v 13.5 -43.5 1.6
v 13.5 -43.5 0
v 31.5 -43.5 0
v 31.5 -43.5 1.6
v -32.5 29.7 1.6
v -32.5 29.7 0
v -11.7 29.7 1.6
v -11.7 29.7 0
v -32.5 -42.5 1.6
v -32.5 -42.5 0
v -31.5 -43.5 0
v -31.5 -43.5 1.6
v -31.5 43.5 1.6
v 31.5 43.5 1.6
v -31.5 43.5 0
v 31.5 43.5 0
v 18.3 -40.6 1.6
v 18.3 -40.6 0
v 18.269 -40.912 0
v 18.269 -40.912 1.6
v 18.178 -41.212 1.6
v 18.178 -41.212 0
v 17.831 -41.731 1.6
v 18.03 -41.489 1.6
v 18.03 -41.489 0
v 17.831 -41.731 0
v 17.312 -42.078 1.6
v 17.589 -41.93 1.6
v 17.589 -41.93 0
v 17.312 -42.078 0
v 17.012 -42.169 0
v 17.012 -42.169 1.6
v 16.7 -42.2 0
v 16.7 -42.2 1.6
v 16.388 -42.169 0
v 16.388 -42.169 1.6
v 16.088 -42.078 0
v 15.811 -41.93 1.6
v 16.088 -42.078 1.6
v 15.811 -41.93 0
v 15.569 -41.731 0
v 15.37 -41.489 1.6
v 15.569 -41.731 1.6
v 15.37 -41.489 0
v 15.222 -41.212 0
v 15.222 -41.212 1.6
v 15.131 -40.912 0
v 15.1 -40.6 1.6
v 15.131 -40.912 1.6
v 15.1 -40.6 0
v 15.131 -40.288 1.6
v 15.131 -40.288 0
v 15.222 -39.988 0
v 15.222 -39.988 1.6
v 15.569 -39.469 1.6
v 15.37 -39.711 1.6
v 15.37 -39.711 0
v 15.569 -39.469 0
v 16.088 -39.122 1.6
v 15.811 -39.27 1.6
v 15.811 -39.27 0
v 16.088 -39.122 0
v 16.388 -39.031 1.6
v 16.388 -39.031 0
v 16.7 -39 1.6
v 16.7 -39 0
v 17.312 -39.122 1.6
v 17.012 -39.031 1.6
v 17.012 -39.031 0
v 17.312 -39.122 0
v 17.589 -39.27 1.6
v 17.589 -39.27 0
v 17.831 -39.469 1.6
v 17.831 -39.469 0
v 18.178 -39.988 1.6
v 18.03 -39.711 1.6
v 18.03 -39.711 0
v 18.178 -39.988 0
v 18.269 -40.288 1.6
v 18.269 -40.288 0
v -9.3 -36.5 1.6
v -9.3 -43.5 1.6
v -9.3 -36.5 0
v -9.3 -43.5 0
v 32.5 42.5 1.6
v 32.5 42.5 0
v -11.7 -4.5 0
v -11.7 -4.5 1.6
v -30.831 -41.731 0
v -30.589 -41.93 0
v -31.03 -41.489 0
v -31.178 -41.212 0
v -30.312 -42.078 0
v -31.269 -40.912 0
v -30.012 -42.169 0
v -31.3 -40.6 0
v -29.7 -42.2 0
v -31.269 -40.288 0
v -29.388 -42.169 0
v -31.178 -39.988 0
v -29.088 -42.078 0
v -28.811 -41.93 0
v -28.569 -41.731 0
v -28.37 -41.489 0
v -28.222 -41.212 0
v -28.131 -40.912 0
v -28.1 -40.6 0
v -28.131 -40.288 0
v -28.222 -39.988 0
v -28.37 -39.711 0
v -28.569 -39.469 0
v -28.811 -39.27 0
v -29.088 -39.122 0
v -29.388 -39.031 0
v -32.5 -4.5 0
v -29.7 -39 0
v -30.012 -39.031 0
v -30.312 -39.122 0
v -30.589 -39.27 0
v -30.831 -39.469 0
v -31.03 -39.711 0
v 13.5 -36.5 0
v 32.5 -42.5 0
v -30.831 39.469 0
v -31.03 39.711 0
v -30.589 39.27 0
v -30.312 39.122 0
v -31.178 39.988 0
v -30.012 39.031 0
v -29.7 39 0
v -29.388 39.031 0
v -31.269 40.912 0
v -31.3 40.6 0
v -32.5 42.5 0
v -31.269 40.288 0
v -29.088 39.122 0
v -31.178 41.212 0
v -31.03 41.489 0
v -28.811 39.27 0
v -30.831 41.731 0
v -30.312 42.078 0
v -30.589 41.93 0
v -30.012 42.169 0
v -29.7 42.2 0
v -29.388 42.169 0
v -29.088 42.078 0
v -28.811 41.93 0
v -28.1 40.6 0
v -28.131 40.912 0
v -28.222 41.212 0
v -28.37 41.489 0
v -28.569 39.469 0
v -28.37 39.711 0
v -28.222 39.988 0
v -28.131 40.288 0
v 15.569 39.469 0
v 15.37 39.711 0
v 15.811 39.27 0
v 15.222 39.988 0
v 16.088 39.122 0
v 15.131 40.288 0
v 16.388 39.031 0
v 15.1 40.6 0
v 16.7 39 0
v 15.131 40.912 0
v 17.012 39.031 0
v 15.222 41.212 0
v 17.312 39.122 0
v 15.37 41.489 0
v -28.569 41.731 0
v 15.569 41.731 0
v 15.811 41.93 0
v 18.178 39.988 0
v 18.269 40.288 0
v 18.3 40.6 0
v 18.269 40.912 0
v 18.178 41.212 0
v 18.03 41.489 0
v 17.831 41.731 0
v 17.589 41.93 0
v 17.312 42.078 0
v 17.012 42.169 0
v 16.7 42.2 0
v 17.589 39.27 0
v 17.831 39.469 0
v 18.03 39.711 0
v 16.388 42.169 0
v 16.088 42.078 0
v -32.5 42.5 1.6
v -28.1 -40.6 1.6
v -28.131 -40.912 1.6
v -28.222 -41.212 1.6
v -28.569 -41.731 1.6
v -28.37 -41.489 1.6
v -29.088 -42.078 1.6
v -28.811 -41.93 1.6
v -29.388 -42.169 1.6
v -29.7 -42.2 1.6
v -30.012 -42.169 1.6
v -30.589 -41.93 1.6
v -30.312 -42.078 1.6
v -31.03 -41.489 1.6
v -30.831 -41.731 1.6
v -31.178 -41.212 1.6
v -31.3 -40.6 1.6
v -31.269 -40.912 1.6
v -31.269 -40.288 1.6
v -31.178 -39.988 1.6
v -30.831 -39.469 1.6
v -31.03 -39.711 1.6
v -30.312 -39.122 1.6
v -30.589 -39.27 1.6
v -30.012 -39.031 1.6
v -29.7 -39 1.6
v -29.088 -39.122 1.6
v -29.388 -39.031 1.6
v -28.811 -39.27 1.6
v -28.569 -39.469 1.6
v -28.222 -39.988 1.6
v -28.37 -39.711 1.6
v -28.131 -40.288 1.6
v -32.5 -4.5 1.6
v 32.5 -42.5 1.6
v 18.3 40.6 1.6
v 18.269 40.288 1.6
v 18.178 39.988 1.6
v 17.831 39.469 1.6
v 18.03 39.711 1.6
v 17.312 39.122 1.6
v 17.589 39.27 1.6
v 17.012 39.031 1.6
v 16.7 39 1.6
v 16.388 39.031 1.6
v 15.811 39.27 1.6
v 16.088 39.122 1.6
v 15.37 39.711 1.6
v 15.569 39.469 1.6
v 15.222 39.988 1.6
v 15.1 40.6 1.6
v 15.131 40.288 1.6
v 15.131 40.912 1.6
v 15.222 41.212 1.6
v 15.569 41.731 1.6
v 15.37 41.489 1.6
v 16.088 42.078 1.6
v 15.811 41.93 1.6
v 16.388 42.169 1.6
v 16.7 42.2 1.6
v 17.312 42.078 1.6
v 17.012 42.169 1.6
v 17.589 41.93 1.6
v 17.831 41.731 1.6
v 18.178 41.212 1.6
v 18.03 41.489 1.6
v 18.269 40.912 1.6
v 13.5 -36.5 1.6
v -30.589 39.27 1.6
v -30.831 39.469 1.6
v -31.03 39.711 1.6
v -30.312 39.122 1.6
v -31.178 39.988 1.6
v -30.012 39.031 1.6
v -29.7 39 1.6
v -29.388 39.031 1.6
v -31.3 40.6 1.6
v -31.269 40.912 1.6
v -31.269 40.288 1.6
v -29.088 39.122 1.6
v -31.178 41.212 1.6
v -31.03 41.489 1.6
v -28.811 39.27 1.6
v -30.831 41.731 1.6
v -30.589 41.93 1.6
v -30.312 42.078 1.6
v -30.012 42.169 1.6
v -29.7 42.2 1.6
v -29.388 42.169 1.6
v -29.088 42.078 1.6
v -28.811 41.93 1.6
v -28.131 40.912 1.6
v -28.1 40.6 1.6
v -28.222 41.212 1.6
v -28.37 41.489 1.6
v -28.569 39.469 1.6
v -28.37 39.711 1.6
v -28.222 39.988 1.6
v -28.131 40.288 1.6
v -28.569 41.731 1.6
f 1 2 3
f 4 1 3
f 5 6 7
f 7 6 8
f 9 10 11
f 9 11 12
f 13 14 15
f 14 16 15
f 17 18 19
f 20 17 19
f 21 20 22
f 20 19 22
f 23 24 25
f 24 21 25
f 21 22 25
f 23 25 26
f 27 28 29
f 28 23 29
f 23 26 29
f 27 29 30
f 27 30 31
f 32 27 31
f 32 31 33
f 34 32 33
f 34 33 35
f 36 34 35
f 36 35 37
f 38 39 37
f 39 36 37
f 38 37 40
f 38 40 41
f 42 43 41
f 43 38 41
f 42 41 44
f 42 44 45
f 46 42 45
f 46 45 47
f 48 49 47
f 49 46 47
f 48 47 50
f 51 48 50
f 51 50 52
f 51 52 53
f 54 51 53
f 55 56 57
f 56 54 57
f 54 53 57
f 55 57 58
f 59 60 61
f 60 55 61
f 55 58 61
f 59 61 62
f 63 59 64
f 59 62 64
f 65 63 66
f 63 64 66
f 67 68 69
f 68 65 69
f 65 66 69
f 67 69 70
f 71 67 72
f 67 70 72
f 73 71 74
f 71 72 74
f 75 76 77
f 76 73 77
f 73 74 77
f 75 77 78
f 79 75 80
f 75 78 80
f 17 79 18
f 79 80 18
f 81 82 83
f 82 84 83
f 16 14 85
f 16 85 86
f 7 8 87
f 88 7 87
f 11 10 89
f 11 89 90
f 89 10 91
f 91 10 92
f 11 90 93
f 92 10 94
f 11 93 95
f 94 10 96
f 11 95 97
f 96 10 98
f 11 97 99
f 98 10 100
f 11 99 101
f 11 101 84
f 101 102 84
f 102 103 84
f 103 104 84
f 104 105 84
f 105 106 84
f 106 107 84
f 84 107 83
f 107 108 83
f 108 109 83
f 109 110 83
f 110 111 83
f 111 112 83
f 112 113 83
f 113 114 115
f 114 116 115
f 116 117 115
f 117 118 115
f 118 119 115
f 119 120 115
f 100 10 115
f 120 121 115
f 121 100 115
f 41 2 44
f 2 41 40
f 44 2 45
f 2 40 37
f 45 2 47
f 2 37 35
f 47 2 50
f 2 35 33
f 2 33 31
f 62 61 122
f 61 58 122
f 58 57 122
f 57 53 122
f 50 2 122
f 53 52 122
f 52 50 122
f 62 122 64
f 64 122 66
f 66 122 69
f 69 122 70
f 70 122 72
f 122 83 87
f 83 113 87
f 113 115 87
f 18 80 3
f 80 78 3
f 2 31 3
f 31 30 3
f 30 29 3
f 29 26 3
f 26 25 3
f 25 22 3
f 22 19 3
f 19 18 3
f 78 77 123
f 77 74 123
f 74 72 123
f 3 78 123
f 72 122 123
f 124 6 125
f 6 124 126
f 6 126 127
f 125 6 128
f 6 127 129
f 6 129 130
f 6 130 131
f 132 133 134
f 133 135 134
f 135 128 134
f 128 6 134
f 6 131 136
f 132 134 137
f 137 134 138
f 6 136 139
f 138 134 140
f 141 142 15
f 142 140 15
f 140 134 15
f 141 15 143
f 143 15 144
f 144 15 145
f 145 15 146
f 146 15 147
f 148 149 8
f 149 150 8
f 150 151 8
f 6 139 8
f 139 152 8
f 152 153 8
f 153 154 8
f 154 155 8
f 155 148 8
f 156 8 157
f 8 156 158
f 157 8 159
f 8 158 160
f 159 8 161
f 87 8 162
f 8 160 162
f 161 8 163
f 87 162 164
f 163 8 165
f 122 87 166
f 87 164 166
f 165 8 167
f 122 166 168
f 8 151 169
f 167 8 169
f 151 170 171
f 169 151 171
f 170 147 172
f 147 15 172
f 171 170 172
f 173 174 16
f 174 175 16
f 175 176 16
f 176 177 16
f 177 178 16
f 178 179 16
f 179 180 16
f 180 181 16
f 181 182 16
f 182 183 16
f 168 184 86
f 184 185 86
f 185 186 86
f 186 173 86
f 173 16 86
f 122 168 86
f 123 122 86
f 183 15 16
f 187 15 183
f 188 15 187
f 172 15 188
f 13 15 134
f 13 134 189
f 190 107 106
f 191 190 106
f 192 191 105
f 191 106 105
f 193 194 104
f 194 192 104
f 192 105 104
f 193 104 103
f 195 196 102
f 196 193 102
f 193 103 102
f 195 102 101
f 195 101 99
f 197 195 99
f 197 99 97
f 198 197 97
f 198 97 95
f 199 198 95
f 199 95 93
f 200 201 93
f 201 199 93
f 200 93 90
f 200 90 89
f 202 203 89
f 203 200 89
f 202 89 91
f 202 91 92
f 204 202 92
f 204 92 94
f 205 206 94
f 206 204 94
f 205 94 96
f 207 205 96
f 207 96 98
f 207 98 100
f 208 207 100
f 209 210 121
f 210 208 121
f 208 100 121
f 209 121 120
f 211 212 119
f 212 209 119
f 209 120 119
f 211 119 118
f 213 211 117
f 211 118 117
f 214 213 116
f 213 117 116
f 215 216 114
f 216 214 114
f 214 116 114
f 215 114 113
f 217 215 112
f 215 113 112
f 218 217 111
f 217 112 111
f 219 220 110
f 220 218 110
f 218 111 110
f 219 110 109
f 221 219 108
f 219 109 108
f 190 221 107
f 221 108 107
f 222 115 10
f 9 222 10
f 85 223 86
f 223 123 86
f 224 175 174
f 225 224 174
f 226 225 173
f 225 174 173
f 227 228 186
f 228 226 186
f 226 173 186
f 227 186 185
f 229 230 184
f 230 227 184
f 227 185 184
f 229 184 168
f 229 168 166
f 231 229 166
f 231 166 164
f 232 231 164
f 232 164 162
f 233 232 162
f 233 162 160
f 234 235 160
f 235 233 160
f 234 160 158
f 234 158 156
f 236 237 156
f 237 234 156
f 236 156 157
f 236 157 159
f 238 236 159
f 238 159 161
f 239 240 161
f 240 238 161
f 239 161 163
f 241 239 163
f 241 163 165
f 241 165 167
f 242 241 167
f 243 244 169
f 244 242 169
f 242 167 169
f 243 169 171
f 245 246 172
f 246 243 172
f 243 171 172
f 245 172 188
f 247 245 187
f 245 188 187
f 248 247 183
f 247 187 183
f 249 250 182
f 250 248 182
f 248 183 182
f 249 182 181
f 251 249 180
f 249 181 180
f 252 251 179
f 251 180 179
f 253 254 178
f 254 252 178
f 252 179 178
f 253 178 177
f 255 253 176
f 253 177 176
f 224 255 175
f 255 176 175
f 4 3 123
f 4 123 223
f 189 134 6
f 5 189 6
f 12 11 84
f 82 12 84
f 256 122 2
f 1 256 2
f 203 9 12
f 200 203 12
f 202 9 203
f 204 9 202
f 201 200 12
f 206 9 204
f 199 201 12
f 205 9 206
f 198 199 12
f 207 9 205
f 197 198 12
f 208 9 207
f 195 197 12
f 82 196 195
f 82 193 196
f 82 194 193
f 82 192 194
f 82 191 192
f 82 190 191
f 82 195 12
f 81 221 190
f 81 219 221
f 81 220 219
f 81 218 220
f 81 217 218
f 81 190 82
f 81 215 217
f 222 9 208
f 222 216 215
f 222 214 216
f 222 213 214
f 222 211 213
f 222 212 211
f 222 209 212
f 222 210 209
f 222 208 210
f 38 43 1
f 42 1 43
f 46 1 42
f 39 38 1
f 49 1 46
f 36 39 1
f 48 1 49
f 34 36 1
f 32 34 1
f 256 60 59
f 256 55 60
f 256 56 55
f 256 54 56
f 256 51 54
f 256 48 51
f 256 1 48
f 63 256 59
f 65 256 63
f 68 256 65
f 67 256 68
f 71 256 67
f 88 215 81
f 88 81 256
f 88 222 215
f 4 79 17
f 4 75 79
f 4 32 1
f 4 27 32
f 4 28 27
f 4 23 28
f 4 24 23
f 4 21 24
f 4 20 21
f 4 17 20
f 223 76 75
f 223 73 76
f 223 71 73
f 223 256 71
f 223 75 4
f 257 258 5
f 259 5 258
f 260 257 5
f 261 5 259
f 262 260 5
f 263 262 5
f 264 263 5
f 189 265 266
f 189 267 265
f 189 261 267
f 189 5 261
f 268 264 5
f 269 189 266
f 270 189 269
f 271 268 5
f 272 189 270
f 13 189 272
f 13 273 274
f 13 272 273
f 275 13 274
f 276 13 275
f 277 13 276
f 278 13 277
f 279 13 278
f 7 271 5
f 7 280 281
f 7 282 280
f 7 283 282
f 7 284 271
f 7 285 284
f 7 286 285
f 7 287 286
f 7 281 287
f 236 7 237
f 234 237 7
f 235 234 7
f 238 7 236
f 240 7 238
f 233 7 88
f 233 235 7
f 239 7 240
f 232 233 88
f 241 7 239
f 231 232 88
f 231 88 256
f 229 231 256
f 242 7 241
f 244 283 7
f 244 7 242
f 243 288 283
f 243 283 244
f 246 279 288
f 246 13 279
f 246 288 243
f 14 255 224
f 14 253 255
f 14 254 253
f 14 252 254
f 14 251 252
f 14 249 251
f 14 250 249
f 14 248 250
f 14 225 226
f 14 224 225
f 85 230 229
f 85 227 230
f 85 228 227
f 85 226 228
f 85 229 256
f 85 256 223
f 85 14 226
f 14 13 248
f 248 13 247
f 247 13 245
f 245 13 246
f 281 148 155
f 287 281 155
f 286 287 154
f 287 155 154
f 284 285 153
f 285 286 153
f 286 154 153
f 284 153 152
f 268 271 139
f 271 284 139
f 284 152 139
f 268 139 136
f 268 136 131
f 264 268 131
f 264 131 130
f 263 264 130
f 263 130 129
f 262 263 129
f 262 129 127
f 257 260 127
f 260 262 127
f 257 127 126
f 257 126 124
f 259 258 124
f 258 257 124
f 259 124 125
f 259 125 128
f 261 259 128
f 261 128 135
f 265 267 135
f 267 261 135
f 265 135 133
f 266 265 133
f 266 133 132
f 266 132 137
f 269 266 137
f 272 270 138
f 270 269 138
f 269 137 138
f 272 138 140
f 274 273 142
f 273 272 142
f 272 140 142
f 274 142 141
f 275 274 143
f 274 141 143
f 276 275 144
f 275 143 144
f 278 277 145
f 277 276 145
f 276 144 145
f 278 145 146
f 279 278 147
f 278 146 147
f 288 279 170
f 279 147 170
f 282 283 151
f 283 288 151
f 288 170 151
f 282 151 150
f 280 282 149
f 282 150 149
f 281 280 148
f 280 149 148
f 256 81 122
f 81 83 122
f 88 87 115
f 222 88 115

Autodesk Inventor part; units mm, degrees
ref_plane "YZ Plane" through (0, 0, 0) normal (1, 0, 0) x (0, 1, 0)
ref_plane "XZ Plane" through (0, 0, 0) normal (0, 1, 0) x (-1, 0, 0)
ref_plane "XY Plane" through (0, 0, 0) normal (0, 0, 1) x (1, 0, 0)
sketch "スケッチ1" plane through (0, 0, 0) normal (0, 0, 1) x (1, 0, 0)
  line L0 (32.5, 43.5) -> (-32.5, 43.5)
  line L1 (-32.5, 43.5) -> (-32.5, -43.5)
  line L2 (-32.5, -43.5) -> (32.5, -43.5)
  line L3 (32.5, -43.5) -> (32.5, 43.5)
  line L4 (32.5, 43.5) -> (-32.5, -43.5) construction
  line L5 (-32.5, 43.5) -> (32.5, -43.5) construction
  line L6 (-32.5, 29.7) -> (-11.7, 29.7)
  line L7 (-11.7, 29.7) -> (-11.7, -4.5)
  line L8 (-11.7, -4.5) -> (-32.5, -4.5)
  line L9 (-9.3, -43.5) -> (-9.3, -36.5)
  line L10 (-9.3, -36.5) -> (13.5, -36.5)
  line L11 (13.5, -36.5) -> (13.5, -43.5)
  line L12 (-29.7, -40.6) -> (16.7, -40.6) construction
  line L13 (16.7, -40.6) -> (16.7, 40.6) construction
  line L14 (16.7, 40.6) -> (-29.7, 40.6) construction
  line L15 (-29.7, 40.6) -> (-29.7, -40.6) construction
  line L16 (-29.7, -40.6) -> (16.7, 40.6) construction
  line L17 (16.7, -40.6) -> (-29.7, 40.6) construction
  circle A0 centre (16.7, 40.6) radius 1.6
  circle A1 centre (-29.7, 40.6) radius 1.6
  circle A2 centre (-29.7, -40.6) radius 1.6
  circle A3 centre (16.7, -40.6) radius 1.6
  line L18 (-32.5, 0) -> (32.5, 0) construction
  point P0 (0, 0)
  point P1 (0, 0)
  point P2 (0, 0)
  point P3 (-6.5, 0)
  dimension "d0" = 87
  dimension "d1" = 65
  dimension "d2" = 13.8
  dimension "d3" = 39
  dimension "d4" = 20.8
  dimension "d5" = 7
  dimension "d6" = 19
  dimension "d7" = 23.2
  dimension "d8" = 22.8
  dimension "d9" = 34.2
  dimension "d10" = 3.2
  dimension "d12" = 81.2
  dimension "d13" = 46.4
  dimension "d19" = 2.8
extrude "押し出し1" add sketch "スケッチ1" along normal blind 1.6 contours L3 L2 L11 L10 L9 L1 L8 L7 L6 L0
chamfer "面取り1" distance 1 angle 45 4 edges at (32.5, -43.5, 0.8) (-32.5, -43.5, 0.8) (32.5, 43.5, 0.8) (-32.5, 43.5, 0.8)
properties part number "A203-V2-Expansion-Board"
